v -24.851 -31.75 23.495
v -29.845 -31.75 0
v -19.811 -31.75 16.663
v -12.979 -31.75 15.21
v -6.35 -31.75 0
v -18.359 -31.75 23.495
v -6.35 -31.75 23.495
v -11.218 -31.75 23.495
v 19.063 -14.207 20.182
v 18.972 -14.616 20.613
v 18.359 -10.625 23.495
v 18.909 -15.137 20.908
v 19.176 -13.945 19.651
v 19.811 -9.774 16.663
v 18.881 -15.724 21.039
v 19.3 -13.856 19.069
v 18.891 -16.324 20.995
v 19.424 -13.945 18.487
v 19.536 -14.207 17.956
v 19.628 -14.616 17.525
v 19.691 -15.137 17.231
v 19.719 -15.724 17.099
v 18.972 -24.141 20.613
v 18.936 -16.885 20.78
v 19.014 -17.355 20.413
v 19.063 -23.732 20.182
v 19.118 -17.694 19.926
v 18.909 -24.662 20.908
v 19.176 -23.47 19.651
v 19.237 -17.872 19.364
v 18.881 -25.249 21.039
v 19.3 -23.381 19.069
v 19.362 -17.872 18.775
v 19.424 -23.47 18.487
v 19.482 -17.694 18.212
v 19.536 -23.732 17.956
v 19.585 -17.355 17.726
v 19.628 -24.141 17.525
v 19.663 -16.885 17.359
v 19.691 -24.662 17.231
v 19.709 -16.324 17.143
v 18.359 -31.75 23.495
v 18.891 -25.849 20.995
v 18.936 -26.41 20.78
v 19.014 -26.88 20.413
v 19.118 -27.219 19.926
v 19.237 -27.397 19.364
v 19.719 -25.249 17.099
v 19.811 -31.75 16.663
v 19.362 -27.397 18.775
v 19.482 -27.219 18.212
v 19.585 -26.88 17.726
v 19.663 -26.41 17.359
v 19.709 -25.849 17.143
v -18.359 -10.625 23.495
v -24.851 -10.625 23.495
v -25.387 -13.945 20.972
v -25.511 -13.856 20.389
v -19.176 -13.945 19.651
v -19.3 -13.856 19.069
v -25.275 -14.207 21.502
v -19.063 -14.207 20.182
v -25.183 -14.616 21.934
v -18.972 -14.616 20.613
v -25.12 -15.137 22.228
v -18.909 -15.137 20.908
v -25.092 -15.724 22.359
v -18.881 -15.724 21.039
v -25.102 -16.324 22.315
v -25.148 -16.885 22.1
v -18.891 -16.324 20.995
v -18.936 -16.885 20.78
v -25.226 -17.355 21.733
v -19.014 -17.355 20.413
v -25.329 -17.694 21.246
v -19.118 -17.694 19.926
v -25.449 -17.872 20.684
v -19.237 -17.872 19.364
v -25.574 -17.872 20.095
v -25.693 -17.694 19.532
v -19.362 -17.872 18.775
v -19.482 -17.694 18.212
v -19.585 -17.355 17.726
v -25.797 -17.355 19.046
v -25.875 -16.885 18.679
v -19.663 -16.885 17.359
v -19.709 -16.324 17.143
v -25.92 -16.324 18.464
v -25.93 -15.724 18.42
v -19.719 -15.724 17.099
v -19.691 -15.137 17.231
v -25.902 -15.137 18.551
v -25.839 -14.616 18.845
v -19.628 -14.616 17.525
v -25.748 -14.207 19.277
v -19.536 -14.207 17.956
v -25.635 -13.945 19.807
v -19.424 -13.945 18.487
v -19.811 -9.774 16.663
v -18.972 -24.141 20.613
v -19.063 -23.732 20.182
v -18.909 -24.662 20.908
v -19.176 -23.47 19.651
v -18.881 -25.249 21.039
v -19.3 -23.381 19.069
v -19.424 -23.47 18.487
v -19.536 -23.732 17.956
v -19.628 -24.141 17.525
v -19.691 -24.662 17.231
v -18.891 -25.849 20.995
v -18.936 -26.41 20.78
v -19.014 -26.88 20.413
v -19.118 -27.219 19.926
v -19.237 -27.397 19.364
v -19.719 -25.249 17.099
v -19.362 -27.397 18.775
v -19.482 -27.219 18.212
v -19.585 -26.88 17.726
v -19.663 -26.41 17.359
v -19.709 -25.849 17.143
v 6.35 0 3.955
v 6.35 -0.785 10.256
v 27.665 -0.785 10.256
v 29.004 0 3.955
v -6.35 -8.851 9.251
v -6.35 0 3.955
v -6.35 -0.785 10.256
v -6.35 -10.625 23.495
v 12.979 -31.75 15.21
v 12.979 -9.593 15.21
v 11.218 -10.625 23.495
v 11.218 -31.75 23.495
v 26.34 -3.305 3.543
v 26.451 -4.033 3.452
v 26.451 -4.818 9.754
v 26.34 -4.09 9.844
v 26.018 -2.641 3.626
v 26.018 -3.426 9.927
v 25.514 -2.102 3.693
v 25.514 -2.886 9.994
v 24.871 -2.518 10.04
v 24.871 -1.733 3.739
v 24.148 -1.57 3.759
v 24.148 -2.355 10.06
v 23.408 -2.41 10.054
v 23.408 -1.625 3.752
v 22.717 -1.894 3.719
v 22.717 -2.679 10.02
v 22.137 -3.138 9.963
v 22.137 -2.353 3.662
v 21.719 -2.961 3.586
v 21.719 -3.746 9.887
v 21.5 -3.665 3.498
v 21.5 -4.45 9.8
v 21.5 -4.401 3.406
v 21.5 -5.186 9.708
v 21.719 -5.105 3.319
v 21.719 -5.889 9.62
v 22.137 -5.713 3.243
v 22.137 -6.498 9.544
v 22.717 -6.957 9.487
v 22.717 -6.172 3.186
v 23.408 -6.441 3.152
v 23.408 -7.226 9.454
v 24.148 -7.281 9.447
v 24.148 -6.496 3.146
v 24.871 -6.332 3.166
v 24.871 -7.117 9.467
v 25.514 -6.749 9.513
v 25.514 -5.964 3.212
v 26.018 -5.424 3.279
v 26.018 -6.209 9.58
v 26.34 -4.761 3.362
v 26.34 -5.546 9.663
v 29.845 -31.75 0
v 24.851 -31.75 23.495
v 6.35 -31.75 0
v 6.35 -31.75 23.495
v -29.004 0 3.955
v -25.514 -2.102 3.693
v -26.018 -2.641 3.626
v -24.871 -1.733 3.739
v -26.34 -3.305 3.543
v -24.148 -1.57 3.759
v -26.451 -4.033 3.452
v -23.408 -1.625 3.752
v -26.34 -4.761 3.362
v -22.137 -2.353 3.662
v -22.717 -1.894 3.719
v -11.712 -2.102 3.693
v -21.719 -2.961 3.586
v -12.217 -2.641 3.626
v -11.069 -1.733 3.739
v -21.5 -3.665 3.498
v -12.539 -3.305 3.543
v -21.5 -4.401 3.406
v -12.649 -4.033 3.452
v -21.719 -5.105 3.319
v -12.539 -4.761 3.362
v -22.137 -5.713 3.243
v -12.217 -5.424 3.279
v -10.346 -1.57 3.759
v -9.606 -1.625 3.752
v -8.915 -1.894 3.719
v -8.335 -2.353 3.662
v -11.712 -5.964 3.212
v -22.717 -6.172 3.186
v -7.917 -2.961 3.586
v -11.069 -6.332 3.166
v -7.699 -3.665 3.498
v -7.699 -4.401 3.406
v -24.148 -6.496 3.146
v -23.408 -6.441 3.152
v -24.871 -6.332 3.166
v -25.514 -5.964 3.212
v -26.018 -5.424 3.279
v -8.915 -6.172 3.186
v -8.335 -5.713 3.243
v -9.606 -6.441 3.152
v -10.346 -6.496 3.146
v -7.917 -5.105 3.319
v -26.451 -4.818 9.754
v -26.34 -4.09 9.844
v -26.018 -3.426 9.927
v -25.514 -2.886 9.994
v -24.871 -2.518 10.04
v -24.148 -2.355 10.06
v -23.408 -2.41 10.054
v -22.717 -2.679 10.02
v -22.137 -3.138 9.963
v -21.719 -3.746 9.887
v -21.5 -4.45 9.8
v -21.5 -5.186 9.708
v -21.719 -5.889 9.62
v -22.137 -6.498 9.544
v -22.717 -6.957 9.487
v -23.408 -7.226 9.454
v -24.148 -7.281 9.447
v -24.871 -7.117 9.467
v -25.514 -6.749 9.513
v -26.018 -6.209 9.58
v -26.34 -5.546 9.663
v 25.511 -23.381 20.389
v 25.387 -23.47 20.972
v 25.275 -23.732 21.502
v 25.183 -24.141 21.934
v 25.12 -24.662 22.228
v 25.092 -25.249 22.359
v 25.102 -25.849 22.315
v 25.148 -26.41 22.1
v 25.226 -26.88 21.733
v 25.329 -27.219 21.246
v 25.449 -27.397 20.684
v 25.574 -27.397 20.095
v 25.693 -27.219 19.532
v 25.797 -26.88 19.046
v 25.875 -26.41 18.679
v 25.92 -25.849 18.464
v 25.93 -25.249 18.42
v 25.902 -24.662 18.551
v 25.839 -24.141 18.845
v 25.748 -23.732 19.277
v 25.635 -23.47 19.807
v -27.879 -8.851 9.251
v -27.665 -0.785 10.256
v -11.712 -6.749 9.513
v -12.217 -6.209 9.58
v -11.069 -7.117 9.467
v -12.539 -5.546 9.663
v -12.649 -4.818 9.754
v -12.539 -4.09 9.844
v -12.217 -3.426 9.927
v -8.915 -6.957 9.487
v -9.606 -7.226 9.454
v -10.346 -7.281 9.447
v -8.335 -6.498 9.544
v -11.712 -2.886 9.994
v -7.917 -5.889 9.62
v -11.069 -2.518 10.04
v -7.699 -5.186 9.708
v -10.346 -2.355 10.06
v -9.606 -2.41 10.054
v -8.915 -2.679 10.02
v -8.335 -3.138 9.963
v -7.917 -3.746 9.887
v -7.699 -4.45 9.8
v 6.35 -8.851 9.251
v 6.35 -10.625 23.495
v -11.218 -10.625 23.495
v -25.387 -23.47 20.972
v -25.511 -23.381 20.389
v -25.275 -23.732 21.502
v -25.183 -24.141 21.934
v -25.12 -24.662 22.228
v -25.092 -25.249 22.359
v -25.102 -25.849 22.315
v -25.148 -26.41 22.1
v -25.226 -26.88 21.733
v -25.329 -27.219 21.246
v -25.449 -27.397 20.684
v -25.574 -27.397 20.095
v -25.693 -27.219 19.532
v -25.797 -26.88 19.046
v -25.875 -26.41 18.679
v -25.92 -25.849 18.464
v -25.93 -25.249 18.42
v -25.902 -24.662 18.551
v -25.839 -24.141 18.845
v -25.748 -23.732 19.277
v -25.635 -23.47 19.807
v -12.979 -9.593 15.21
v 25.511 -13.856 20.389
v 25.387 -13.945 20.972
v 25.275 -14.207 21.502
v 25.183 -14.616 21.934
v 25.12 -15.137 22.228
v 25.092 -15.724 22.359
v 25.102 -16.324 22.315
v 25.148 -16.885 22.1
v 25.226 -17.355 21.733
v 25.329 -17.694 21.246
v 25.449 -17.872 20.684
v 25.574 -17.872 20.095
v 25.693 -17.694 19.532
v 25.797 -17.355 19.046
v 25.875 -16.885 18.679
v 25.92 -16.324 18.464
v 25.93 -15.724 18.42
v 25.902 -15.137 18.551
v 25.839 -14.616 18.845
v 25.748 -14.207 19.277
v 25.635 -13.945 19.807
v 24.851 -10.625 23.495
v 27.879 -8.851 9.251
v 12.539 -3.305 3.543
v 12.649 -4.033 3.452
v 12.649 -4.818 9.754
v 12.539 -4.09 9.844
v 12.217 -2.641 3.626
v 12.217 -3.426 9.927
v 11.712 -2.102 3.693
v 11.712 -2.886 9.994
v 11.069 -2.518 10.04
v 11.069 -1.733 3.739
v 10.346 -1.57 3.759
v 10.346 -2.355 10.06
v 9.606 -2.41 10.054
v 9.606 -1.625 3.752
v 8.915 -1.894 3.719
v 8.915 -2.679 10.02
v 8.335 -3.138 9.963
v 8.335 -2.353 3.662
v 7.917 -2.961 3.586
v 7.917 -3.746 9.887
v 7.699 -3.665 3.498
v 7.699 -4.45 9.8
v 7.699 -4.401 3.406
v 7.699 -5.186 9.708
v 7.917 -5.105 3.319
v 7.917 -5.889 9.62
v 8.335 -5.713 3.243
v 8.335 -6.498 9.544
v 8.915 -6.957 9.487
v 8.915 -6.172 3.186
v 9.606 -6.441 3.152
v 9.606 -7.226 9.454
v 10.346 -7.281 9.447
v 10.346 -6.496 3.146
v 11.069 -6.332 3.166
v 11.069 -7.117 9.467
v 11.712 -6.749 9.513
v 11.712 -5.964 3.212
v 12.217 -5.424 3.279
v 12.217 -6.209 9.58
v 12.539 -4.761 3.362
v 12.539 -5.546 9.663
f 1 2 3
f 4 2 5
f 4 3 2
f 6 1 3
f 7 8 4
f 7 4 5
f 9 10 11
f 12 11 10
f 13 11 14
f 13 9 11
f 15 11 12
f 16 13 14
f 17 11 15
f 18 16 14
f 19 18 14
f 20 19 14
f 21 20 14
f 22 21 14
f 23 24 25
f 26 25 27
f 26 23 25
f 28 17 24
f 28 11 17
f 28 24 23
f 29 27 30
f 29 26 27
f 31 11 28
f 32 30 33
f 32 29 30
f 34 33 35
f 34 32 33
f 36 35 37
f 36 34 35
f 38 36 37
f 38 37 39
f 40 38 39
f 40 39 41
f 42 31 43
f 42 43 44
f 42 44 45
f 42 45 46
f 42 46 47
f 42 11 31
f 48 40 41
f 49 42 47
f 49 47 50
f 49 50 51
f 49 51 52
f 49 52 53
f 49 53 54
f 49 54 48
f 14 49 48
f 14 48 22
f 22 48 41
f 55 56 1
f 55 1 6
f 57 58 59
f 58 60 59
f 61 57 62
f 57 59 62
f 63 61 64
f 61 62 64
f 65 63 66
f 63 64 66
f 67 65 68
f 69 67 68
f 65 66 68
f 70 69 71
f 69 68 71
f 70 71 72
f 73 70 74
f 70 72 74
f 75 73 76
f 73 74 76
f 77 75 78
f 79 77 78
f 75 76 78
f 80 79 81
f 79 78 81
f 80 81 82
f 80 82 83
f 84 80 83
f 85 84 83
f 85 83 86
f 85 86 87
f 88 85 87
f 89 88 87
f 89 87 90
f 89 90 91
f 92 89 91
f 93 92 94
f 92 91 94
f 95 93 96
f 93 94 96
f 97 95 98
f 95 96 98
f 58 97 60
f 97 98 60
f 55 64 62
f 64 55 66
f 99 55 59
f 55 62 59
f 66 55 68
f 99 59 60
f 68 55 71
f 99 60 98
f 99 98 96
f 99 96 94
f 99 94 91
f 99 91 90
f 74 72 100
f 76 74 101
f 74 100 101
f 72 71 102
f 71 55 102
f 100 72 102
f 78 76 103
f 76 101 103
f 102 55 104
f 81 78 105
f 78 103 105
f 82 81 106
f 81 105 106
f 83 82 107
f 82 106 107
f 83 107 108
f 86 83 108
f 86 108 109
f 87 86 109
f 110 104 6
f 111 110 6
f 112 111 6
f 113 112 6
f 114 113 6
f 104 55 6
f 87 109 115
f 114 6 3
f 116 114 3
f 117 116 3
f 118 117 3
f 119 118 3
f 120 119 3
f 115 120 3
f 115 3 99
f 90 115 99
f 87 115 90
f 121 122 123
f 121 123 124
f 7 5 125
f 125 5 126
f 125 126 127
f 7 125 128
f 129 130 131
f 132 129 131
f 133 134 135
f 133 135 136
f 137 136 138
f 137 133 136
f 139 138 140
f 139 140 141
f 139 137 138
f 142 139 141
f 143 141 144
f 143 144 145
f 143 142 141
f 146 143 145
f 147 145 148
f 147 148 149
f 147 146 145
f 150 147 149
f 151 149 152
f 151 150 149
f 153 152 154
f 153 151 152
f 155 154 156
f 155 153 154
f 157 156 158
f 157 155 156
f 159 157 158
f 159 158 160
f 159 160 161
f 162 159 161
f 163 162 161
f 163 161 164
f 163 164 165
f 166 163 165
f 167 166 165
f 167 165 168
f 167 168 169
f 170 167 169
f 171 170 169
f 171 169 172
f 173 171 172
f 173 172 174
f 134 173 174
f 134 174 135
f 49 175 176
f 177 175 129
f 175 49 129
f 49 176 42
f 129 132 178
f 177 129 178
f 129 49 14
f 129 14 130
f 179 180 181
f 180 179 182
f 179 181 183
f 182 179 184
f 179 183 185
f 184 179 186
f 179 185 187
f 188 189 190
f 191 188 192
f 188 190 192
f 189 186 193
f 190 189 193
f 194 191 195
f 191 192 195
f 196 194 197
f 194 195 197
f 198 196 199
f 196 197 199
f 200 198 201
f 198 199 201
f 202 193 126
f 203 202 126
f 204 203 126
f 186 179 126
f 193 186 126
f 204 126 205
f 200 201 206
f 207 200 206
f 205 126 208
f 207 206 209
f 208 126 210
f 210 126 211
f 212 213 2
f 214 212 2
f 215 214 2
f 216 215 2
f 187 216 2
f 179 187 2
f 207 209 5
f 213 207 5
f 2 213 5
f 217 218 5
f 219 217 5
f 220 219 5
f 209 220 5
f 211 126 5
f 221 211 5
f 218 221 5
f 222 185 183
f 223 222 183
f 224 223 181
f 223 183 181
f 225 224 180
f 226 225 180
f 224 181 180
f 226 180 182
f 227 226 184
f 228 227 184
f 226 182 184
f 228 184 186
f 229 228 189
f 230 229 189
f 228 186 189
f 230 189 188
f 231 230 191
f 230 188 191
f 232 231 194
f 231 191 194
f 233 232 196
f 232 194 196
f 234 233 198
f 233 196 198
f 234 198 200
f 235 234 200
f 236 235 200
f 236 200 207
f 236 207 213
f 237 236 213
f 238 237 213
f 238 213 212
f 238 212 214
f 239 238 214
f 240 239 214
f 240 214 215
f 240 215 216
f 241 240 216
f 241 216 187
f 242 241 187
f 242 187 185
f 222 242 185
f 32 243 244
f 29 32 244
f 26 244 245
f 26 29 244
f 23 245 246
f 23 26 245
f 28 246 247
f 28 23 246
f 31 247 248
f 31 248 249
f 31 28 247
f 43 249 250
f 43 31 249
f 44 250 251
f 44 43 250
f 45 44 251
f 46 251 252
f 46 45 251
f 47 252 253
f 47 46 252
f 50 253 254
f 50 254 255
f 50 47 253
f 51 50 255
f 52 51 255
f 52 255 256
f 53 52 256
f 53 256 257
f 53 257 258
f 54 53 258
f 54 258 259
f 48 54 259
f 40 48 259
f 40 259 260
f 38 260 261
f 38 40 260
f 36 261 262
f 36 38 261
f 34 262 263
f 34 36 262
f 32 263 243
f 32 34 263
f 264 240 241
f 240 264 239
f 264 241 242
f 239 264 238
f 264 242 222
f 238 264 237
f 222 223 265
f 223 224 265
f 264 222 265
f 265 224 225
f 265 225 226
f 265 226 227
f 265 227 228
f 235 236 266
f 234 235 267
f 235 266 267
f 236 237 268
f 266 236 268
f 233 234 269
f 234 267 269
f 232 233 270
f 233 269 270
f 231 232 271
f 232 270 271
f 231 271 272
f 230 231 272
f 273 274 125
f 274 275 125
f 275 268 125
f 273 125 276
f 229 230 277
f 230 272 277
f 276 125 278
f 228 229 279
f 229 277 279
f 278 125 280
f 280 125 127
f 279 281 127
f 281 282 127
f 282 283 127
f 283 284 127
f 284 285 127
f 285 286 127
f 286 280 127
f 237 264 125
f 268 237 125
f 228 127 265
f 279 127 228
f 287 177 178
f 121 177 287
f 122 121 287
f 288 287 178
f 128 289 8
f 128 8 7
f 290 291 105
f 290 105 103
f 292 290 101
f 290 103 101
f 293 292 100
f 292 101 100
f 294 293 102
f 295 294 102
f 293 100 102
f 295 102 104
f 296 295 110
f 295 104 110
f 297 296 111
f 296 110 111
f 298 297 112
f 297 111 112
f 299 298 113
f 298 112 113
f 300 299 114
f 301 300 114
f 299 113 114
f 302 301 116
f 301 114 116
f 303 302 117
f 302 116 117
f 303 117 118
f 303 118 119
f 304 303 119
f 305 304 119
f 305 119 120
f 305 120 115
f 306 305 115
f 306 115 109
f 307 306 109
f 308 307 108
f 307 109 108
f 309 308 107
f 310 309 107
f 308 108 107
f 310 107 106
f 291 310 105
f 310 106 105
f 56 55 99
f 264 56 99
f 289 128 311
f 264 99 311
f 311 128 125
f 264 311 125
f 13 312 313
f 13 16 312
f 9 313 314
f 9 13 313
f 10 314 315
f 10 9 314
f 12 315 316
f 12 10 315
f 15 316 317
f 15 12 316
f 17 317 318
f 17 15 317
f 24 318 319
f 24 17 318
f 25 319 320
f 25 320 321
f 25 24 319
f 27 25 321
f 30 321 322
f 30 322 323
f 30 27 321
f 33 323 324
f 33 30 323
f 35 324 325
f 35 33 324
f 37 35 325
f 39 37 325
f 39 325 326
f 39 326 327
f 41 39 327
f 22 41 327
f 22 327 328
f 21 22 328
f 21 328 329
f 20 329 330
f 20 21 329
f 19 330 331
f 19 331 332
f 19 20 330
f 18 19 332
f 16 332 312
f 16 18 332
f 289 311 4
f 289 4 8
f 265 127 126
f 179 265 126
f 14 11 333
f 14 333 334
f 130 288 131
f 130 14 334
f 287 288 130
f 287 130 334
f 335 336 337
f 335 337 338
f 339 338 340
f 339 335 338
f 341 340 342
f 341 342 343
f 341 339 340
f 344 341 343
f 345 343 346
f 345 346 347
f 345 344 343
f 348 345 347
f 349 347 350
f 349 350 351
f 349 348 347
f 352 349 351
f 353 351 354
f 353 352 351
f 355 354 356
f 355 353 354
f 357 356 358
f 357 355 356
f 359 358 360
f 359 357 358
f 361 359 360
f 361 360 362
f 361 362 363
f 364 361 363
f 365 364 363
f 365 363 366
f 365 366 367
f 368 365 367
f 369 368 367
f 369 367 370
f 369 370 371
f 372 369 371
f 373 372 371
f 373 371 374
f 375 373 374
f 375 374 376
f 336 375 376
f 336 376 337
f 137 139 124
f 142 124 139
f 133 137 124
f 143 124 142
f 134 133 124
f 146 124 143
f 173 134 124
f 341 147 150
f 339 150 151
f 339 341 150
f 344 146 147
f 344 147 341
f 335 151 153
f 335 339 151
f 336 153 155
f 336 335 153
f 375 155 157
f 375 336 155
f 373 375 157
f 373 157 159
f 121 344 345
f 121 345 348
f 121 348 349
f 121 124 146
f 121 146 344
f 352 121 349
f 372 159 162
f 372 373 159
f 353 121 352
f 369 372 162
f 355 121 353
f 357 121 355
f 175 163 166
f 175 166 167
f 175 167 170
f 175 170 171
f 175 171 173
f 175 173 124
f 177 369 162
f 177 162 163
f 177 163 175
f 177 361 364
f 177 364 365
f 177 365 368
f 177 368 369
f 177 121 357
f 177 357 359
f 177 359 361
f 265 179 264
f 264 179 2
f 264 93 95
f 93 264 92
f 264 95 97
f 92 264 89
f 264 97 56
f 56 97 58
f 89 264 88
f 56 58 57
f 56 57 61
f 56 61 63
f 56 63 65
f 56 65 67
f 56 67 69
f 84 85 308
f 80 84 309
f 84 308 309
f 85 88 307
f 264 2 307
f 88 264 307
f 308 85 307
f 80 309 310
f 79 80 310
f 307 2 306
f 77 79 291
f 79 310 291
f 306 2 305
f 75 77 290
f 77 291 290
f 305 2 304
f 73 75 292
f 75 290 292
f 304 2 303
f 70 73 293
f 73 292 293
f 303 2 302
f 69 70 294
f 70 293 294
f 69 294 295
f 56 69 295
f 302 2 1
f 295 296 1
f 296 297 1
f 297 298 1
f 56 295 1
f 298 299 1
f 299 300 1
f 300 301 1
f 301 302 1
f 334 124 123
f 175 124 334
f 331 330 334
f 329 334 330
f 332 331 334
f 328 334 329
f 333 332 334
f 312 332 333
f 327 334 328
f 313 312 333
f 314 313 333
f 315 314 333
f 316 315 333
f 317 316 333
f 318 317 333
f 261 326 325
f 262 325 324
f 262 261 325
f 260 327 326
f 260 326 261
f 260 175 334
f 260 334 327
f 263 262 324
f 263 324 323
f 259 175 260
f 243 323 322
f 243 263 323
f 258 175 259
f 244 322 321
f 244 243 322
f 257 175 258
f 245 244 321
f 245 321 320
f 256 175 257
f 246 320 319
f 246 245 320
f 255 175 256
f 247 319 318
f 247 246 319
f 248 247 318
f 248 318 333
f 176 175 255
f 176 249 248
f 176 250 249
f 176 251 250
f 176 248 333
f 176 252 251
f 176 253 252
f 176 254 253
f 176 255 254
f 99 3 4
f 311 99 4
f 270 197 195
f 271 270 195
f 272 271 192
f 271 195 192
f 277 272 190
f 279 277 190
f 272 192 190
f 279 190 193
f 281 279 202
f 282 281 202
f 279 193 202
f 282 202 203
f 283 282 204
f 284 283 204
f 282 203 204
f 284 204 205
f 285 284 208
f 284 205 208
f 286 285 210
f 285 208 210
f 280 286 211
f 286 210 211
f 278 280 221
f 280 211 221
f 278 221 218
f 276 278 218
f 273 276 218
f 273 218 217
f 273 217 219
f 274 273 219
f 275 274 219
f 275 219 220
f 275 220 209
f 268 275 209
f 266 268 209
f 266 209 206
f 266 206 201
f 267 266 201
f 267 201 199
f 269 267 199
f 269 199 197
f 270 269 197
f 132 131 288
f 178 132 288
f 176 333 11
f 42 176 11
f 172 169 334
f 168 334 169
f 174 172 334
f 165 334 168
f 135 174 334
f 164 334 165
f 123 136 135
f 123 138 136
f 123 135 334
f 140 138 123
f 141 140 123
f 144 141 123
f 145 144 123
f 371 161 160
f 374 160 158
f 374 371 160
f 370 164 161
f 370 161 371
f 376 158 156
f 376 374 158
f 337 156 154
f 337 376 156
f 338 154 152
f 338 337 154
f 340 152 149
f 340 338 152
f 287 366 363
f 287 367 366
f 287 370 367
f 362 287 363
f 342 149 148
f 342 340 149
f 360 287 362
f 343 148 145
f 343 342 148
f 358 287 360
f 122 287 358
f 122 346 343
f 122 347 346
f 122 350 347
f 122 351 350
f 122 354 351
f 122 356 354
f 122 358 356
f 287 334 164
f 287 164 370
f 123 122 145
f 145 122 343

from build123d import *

# Parameters (mm, degrees)
F0_W     = 23.495
F0_H     = 23.495
F1_DEPTH = 31.75
F3_DEPTH = 31.751
F5_DEPTH = 31.751
F7_D     = 4.0386
F7_DEPTH = 6.35
F7_TIP   = 1.213317848
F9_DEPTH = 23.496
F11_D    = 4.9784


with BuildPart() as f1:
    # F0 (on Front) → F1 (new body)
    with BuildSketch(Plane.XZ):
        with Locations((-18.0975, 11.7475)):
            Rectangle(F0_W, F0_H)
    extrude(amount=F1_DEPTH)

    # F2 (on face) → F3 (cut, through all)
    with BuildSketch(Plane.XZ.offset(31.75)):
        Polygon((-29.845, 23.495), (-29.845, 0), (-24.8509835836, 23.495), align=None)
    extrude(amount=-F3_DEPTH, mode=Mode.SUBTRACT)

    # F4 (on face) → F5 (cut, through all)
    with BuildSketch(Plane.XZ.offset(31.75)):
        Polygon((-11.218071751, 23.495), (-18.3591208062, 23.495), (-19.8113839665, 16.6626390089), (-12.9790229754, 15.2103758485), align=None)
    extrude(amount=-F5_DEPTH, mode=Mode.SUBTRACT)

    # F7
    with Locations(Plane(origin=(-28.5548820917, 0, 6.0695275563), x_dir=(0, -1, 0), z_dir=(-0.9781476007, 0, 0.2079116908))):
        with Locations((25.4, 14.6397678639), (15.875, 14.6397678639)):
            Hole(F7_D / 2, depth=F7_DEPTH)
            with Locations((0, 0, -(F7_DEPTH + F7_TIP / 2))):  # 118° drill point
                Cone(0, F7_D / 2, F7_TIP, mode=Mode.SUBTRACT)

    # F8 (on face) → F9 (cut, through all)
    with BuildSketch(Plane.YZ.offset(-6.35)):
        Polygon((-0.7848693773, 10.2559793592), (0, 3.9546715536), (0, 10.353740008), align=None)
        Polygon((0, 3.9546715536), (-31.75, 0), (0, 0), align=None)
        Polygon((-0.7848693773, 10.2559793592), (0, 10.353740008), (0, 23.495), (-10.6246841903, 23.495), (-8.8505433684, 9.2513465563), align=None)
    extrude(amount=-F9_DEPTH, mode=Mode.SUBTRACT)

    # F11 (through all)
    with Locations(Plane(origin=(0, -1.2699244477, 10.1955625564), x_dir=(1, 0, 0), z_dir=(0, -0.1236014767, 0.9923319379))):
        with Locations((-23.961794938, -3.5751967559), (-10.16, -3.5751967559)):
            Hole(F11_D / 2)


with BuildPart() as f12_1:
    # F12: instance of F1
    add(f1.part.mirror(Plane.YZ))


solid = Compound([f1.part, f12_1.part])
